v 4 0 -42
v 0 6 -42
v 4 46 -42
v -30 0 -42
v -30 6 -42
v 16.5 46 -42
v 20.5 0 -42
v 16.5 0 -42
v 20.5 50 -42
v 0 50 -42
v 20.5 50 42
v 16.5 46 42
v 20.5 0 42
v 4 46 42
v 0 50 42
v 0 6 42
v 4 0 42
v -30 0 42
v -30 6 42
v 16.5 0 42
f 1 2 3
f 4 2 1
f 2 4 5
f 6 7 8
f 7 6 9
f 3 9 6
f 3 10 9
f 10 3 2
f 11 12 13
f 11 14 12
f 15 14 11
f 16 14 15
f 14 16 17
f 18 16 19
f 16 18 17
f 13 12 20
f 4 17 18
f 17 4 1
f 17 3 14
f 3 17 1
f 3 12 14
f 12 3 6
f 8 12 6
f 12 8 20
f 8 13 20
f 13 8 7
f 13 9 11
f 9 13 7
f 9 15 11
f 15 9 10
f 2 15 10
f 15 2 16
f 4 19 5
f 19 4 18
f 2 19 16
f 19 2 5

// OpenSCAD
// 8-tube PCR strip holder that hooks over a 12 mm ice-bucket wall.
// Printed as used: rests on the XY plane (z = 0), builds upward (+Z),
// centred on x = 0. The YZ profile is an upside-down U that fits over
// the wall; a flat ledge extends toward -Y into the ice and carries the
// eight tube holes.

// ---- dimensions (mm) ----
$fn = 64;

// overall extrusion of the YZ profile, along X, centred on x = 0
extrude_len   = 84;

// upside-down U profile (YZ plane)
inner_leg_y0  = 0;      // inner face of inner leg (against wall)
inner_leg_y1  = 4;      // outer face of inner leg  (wall thickness = 4)
outer_leg_y0  = 16.5;   // inner face of outer leg  (gap = 12.5 for the 12 mm wall)
outer_leg_y1  = 20.5;   // outer face of outer leg  (outer leg thickness = 4)
leg_z0        = 0;      // bottom of both legs (sits on the XY plane)
leg_z1        = 50;     // top of both legs
bridge_z0     = 46;     // bottom of the top bridge
bridge_z1     = 50;     // top of the top bridge

// flat ledge that reaches toward -Y into the ice
ledge_y0      = -30;    // far end of the ledge
ledge_y1      = 0;      // meets the foot of the inner leg
ledge_z0      = 0;      // bottom of the ledge
ledge_z1      = 6;      // top of the ledge (6 mm thick)

// eight vertical tube through-holes in the ledge
n_tubes       = 8;
hole_d        = 6.4;    // hole diameter
hole_pitch    = 9;      // spacing along X
hole_y        = -15;    // hole centre in Y
hole_z0       = -1;     // extend past the bottom face (z = 0)
hole_z1       = 7;      // extend past the top face (z = 6)

// ---- solid ----
difference() {
    union() {
        // upside-down U profile in the YZ plane, extruded 84 mm along X
        linear_extrude(extrude_len, center = true) {
            // inner leg (y = 0..4, z = 0..50)
            polygon([
                [inner_leg_y0, leg_z0],
                [inner_leg_y1, leg_z0],
                [inner_leg_y1, leg_z1],
                [inner_leg_y0, leg_z1]
            ]);
            // outer leg (y = 16.5..20.5, z = 0..50)
            polygon([
                [outer_leg_y0, leg_z0],
                [outer_leg_y1, leg_z0],
                [outer_leg_y1, leg_z1],
                [outer_leg_y0, leg_z1]
            ]);
            // top bridge joining the legs (y = 0..20.5, z = 46..50)
            polygon([
                [inner_leg_y0, bridge_z0],
                [outer_leg_y1, bridge_z0],
                [outer_leg_y1, bridge_z1],
                [inner_leg_y0, bridge_z1]
            ]);
        }

        // flat ledge toward -Y (y = -30..0, z = 0..6), extruded 84 mm along X
        linear_extrude(extrude_len, center = true) {
            polygon([
                [ledge_y0, ledge_z0],
                [ledge_y1, ledge_z0],
                [ledge_y1, ledge_z1],
                [ledge_y0, ledge_z1]
            ]);
        }
    }

    // eight vertical 6.4 mm through-holes, 9 mm apart along X, centred, at y = -15
    for (i = [0 : n_tubes - 1]) {
        x_pos = (i - (n_tubes - 1) / 2) * hole_pitch;
        translate([x_pos, hole_y, hole_z0]) {
            cylinder(h = (hole_z1 - hole_z0), r = hole_d / 2, $fn = $fn);
        }
    }
}
